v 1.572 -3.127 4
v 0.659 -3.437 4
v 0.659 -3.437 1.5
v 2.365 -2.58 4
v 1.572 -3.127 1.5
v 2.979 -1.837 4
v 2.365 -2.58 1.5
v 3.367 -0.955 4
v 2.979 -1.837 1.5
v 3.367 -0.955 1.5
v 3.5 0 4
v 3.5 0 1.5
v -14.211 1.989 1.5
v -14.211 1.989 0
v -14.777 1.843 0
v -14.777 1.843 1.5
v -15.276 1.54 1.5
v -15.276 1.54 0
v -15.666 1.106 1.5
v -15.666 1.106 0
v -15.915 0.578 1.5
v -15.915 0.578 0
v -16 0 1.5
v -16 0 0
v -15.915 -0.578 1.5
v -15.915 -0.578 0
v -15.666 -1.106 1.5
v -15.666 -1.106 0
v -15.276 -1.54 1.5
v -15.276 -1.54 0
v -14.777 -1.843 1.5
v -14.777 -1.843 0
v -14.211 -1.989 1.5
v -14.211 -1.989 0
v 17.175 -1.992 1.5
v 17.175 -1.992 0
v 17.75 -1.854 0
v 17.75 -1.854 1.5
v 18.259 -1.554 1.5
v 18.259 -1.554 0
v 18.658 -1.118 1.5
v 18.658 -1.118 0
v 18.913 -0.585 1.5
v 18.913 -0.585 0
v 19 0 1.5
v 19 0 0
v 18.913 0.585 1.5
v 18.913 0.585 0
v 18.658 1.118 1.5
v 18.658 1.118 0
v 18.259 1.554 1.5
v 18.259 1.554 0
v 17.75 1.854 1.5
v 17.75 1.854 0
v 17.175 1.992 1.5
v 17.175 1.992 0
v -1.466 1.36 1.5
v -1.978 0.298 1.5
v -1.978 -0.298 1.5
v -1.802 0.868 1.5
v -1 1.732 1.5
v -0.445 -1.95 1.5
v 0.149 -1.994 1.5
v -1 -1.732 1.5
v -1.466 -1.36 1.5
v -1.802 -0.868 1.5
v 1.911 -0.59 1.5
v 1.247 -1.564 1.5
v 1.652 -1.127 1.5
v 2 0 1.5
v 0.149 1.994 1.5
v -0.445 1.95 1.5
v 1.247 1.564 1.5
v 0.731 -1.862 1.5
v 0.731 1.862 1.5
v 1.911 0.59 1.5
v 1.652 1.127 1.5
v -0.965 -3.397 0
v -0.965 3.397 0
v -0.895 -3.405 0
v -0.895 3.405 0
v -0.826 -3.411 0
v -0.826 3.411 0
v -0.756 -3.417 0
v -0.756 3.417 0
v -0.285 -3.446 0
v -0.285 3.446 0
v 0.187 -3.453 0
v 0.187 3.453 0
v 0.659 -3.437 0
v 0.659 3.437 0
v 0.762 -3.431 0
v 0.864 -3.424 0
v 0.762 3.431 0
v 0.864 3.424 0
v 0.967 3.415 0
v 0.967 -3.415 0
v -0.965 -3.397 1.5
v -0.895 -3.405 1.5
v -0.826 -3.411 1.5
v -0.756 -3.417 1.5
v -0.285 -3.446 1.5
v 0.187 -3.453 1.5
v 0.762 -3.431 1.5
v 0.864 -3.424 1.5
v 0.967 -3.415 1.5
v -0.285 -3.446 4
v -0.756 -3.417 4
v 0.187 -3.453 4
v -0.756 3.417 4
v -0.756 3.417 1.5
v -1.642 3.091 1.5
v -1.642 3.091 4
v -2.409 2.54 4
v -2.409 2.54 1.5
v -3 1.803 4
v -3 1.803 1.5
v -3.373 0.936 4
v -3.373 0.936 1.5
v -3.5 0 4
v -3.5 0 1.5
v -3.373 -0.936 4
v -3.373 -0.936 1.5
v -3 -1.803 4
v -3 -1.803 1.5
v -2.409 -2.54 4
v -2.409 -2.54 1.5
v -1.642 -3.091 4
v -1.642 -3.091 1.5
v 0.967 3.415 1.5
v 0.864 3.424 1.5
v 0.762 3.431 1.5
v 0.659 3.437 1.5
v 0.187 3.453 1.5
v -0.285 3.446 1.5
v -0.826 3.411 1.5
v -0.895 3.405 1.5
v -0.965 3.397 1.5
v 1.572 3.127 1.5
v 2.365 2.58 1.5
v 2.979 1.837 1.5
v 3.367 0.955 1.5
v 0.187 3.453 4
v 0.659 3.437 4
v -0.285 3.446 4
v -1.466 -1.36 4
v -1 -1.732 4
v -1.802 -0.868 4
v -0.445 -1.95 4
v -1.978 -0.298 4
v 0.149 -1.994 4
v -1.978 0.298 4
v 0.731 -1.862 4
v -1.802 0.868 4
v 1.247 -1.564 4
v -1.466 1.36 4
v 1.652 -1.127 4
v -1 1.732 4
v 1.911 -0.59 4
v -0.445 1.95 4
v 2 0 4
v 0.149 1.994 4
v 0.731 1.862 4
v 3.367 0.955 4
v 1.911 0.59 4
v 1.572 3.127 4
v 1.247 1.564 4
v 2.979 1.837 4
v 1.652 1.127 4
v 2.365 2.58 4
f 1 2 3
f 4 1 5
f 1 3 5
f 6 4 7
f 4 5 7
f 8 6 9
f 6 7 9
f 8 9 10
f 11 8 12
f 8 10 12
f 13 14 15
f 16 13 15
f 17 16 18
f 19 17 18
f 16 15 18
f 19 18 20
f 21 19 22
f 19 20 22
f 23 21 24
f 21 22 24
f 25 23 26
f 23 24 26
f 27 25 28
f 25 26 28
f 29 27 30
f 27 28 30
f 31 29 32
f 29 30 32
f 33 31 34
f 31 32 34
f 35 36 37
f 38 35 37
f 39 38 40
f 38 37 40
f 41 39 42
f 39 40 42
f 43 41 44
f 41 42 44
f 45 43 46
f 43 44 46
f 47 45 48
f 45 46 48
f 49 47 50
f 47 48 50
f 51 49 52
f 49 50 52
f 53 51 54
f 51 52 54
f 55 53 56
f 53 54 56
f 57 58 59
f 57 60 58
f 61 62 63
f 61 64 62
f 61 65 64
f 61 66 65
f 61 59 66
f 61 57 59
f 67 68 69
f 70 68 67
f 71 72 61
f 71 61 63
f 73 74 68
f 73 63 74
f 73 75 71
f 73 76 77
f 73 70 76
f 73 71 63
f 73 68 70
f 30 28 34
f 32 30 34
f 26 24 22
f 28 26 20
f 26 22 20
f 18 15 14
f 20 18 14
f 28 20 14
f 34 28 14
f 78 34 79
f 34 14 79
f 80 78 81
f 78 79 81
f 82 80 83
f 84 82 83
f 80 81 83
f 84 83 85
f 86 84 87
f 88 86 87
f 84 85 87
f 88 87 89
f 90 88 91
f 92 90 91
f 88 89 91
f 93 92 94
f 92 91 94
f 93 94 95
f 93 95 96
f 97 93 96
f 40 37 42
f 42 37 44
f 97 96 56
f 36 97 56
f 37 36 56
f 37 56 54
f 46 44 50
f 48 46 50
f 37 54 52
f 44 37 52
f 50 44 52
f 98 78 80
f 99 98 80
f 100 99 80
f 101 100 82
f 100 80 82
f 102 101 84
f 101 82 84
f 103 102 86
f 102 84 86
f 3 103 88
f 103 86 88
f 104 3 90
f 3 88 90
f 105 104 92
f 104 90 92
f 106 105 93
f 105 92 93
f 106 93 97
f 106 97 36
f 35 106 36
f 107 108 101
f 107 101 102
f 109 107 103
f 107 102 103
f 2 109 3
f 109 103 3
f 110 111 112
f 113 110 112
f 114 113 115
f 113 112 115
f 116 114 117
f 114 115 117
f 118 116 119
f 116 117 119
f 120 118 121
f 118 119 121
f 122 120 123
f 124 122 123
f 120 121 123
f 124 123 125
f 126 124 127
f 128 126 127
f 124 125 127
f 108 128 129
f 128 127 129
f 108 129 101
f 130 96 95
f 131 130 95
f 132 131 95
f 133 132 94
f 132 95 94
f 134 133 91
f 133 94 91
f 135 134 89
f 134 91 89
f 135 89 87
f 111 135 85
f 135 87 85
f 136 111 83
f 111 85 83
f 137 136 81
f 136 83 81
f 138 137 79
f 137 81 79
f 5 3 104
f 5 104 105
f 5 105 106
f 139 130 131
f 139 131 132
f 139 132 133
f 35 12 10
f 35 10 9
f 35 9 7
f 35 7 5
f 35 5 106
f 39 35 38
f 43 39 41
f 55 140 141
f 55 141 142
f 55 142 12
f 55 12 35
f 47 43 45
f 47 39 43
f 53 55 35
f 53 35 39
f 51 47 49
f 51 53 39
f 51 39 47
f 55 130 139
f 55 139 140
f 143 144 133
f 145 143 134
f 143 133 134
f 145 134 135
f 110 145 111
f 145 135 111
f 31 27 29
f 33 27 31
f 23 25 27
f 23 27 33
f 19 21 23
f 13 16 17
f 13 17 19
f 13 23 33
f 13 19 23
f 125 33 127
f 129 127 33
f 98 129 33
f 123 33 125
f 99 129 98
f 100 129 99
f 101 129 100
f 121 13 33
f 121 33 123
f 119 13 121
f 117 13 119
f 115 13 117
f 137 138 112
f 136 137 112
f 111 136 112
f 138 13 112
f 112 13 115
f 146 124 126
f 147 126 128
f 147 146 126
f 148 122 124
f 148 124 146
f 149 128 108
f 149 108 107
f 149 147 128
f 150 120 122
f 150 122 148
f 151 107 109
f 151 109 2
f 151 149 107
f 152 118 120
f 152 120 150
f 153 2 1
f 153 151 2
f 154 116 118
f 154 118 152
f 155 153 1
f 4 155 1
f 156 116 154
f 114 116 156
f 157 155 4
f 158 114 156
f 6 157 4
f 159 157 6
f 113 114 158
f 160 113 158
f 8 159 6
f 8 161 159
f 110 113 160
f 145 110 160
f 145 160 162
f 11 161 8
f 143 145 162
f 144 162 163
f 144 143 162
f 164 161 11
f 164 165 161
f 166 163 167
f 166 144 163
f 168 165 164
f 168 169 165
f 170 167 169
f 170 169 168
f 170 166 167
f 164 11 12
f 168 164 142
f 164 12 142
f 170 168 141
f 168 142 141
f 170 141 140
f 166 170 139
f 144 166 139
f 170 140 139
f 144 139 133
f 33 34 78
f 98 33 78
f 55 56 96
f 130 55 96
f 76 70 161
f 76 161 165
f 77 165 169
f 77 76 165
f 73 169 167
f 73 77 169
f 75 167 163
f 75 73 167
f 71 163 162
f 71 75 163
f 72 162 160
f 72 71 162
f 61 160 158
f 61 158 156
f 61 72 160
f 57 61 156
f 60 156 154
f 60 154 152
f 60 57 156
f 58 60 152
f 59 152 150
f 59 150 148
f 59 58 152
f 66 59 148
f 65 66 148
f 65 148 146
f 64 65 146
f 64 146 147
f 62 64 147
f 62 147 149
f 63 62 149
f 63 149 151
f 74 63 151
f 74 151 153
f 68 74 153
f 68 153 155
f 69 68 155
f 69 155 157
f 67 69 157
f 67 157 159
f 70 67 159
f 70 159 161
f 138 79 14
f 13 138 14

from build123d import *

# Parameters (mm, degrees)
BOSS_EXTRUDE1_DEPTH = 1.5
SKETCH1_3_R         = 2
BOSS_EXTRUDE2_DEPTH = 4


with BuildPart() as part:
    # Sketch1 → Boss-Extrude1 (new body)
    with BuildSketch(Plane.XY):
        with BuildLine():
            Line((-0.965077795, 3.3973761), (-14.211482552, 1.988787352))
            ThreePointArc((-14.211482552, 1.988787352), (-16, 0), (-14.211482552, -1.988787352))
            Line((-14.211482552, -1.988787352), (-0.965077795, -3.3973761))
            ThreePointArc((-0.965077795, -3.3973761), (0.000431807, -3.453017023), (0.966800983, -3.415131426))
            Line((0.966800983, -3.415131426), (17.174893203, -1.992338417))
            ThreePointArc((17.174893203, -1.992338417), (19, 0), (17.174893203, 1.992338417))
            Line((17.174893203, 1.992338417), (0.966800983, 3.415131426))
            ThreePointArc((0.966800983, 3.415131426), (0.000431807, 3.453017023), (-0.965077795, 3.3973761))
        make_face()
    extrude(amount=BOSS_EXTRUDE1_DEPTH)

    # Sketch1<3> → Boss-Extrude2 (add)
    with BuildSketch(Plane.XY):
        with BuildLine():
            ThreePointArc((0.65921534, 3.437358744), (-0.048694481, 3.452444827), (-0.755897232, 3.417399505))
            ThreePointArc((-0.755897232, 3.417399505), (-3.5, 0), (-0.755897232, -3.417399505))
            ThreePointArc((-0.755897232, -3.417399505), (-0.048694481, -3.452444827), (0.65921534, -3.437358744))
            ThreePointArc((0.65921534, -3.437358744), (2.697893038, -2.229657632), (3.5, 0))
            ThreePointArc((3.5, 0), (2.697893038, 2.229657632), (0.65921534, 3.437358744))
        make_face()
        Circle(SKETCH1_3_R, mode=Mode.SUBTRACT)
    extrude(amount=BOSS_EXTRUDE2_DEPTH)


solid = part.part
